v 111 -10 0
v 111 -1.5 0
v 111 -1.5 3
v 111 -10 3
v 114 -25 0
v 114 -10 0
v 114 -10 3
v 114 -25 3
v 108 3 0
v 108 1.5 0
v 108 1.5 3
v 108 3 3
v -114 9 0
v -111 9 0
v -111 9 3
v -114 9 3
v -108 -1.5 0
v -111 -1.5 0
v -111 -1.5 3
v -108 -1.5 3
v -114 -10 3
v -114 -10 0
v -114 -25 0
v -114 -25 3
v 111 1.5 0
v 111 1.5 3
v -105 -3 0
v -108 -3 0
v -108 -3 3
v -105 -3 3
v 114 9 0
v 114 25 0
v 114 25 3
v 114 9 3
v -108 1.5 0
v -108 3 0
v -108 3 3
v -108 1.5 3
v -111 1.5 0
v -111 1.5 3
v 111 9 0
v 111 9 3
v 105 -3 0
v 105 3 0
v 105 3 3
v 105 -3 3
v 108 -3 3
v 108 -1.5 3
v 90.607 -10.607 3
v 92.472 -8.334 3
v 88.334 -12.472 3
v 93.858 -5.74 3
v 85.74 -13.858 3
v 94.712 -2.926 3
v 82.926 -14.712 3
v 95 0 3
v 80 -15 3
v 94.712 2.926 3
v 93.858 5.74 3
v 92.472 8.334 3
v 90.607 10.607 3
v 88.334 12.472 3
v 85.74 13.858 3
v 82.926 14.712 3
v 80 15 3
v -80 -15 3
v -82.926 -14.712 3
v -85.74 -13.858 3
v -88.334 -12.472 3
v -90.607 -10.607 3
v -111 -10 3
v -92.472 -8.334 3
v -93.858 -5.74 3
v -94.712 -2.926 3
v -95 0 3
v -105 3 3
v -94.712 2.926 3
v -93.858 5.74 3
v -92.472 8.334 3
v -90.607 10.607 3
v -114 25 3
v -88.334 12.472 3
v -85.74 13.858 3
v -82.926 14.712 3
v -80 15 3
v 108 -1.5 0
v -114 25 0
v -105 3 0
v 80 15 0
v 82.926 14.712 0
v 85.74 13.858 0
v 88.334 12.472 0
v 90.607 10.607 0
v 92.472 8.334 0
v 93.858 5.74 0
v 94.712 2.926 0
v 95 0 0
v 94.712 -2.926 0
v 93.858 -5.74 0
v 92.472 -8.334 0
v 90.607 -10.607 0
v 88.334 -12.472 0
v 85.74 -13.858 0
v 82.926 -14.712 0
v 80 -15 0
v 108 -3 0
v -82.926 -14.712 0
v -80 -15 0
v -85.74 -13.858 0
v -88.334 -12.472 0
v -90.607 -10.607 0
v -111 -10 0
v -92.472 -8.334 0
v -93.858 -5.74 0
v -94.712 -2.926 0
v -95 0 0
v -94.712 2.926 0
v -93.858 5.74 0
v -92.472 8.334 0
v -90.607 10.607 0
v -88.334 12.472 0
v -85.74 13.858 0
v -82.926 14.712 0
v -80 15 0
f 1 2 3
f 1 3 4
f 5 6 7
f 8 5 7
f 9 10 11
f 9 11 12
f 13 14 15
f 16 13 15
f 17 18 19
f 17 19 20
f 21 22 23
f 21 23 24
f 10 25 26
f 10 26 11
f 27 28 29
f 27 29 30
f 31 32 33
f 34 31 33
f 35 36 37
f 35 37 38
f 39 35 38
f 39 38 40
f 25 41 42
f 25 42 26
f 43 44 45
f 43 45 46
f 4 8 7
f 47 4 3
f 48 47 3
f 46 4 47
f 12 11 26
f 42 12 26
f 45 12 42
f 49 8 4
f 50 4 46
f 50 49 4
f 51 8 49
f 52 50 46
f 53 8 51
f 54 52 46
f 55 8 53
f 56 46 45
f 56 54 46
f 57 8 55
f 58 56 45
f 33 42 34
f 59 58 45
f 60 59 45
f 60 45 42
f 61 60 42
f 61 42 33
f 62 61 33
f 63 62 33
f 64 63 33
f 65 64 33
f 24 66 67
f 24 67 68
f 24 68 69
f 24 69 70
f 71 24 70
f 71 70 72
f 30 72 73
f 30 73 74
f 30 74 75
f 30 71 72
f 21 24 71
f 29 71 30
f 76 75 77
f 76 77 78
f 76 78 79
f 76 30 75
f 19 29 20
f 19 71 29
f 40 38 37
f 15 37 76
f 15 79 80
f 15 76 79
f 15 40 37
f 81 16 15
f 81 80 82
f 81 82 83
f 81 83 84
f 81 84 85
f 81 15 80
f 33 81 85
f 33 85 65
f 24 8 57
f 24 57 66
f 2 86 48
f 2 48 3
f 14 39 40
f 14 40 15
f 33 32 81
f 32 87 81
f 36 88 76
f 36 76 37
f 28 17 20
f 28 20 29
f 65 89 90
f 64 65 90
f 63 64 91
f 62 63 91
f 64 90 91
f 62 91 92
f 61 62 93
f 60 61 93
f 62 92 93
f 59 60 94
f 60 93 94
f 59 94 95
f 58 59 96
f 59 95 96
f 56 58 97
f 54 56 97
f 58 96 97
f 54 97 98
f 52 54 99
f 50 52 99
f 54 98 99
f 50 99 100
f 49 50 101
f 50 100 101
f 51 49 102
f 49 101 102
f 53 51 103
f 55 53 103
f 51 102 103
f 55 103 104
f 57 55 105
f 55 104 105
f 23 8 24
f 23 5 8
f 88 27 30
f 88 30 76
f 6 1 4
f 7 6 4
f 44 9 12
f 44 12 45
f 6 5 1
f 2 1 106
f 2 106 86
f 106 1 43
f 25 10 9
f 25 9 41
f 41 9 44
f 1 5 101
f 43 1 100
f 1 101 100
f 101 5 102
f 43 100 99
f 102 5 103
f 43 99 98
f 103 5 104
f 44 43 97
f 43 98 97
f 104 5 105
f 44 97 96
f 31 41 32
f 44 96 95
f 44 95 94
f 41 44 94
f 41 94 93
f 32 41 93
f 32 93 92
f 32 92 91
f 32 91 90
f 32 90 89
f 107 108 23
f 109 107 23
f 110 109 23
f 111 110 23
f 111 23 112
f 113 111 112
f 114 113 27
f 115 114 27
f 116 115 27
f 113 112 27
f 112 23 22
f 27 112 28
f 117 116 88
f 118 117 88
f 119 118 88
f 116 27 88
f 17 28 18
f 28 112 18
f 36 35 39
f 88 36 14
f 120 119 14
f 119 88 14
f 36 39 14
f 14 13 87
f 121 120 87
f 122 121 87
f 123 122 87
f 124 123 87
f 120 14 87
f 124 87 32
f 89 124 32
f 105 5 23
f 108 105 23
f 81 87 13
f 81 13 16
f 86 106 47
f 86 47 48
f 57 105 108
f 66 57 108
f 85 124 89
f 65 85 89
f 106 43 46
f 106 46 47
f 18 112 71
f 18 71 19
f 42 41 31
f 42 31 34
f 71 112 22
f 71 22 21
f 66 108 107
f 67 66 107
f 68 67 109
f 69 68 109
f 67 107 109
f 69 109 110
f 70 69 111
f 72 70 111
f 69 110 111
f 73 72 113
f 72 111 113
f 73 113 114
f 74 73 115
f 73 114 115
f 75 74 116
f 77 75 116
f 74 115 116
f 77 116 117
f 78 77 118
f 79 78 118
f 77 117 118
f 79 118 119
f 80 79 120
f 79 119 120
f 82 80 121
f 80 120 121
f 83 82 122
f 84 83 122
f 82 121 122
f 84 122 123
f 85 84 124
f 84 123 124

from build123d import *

# Parameters (mm, degrees)
SALIENTE_EXTRUIR1_DEPTH = 3
CROQUIS2_W              = 3
CROQUIS2_H              = 16
CROQUIS2_H_2            = 15
SALIENTE_EXTRUIR2_DEPTH = 3


with BuildPart() as part:
    # Croquis1 → Saliente-Extruir1 (new body)
    with BuildSketch(Plane.XY):
        Polygon((111, -25), (-111, -25), (-111, -1.5), (-108, -1.5), (-108, -3), (-105, -3), (-105, 3), (-108, 3), (-108, 1.5), (-111, 1.5), (-111, 25), (111, 25), (111, 1.5), (108, 1.5), (108, 3), (105, 3), (105, -3), (108, -3), (108, -1.5), (111, -1.5), align=None)
        with BuildLine():
            Line((80, -15), (-80, -15))
            ThreePointArc((-80, -15), (-95, 0), (-80, 15))
            Line((-80, 15), (80, 15))
            ThreePointArc((80, 15), (95, 0), (80, -15))
        make_face(mode=Mode.SUBTRACT)
    extrude(amount=SALIENTE_EXTRUIR1_DEPTH)

    # Croquis2 → Saliente-Extruir2 (add)
    with BuildSketch(Plane.ZY.offset(111)):
        with Locations((1.5, 17)):
            Rectangle(CROQUIS2_W, CROQUIS2_H)
        with Locations((1.5, -17.5)):
            Rectangle(CROQUIS2_W, CROQUIS2_H_2)
    saliente_extruir2 = extrude(amount=SALIENTE_EXTRUIR2_DEPTH)

    # Simetría1: Saliente-Extruir2 across plane
    add(saliente_extruir2.mirror(Plane(origin=(0, 0, 0), x_dir=(0, 0, 1), z_dir=(1, 0, 0))))


solid = part.part
